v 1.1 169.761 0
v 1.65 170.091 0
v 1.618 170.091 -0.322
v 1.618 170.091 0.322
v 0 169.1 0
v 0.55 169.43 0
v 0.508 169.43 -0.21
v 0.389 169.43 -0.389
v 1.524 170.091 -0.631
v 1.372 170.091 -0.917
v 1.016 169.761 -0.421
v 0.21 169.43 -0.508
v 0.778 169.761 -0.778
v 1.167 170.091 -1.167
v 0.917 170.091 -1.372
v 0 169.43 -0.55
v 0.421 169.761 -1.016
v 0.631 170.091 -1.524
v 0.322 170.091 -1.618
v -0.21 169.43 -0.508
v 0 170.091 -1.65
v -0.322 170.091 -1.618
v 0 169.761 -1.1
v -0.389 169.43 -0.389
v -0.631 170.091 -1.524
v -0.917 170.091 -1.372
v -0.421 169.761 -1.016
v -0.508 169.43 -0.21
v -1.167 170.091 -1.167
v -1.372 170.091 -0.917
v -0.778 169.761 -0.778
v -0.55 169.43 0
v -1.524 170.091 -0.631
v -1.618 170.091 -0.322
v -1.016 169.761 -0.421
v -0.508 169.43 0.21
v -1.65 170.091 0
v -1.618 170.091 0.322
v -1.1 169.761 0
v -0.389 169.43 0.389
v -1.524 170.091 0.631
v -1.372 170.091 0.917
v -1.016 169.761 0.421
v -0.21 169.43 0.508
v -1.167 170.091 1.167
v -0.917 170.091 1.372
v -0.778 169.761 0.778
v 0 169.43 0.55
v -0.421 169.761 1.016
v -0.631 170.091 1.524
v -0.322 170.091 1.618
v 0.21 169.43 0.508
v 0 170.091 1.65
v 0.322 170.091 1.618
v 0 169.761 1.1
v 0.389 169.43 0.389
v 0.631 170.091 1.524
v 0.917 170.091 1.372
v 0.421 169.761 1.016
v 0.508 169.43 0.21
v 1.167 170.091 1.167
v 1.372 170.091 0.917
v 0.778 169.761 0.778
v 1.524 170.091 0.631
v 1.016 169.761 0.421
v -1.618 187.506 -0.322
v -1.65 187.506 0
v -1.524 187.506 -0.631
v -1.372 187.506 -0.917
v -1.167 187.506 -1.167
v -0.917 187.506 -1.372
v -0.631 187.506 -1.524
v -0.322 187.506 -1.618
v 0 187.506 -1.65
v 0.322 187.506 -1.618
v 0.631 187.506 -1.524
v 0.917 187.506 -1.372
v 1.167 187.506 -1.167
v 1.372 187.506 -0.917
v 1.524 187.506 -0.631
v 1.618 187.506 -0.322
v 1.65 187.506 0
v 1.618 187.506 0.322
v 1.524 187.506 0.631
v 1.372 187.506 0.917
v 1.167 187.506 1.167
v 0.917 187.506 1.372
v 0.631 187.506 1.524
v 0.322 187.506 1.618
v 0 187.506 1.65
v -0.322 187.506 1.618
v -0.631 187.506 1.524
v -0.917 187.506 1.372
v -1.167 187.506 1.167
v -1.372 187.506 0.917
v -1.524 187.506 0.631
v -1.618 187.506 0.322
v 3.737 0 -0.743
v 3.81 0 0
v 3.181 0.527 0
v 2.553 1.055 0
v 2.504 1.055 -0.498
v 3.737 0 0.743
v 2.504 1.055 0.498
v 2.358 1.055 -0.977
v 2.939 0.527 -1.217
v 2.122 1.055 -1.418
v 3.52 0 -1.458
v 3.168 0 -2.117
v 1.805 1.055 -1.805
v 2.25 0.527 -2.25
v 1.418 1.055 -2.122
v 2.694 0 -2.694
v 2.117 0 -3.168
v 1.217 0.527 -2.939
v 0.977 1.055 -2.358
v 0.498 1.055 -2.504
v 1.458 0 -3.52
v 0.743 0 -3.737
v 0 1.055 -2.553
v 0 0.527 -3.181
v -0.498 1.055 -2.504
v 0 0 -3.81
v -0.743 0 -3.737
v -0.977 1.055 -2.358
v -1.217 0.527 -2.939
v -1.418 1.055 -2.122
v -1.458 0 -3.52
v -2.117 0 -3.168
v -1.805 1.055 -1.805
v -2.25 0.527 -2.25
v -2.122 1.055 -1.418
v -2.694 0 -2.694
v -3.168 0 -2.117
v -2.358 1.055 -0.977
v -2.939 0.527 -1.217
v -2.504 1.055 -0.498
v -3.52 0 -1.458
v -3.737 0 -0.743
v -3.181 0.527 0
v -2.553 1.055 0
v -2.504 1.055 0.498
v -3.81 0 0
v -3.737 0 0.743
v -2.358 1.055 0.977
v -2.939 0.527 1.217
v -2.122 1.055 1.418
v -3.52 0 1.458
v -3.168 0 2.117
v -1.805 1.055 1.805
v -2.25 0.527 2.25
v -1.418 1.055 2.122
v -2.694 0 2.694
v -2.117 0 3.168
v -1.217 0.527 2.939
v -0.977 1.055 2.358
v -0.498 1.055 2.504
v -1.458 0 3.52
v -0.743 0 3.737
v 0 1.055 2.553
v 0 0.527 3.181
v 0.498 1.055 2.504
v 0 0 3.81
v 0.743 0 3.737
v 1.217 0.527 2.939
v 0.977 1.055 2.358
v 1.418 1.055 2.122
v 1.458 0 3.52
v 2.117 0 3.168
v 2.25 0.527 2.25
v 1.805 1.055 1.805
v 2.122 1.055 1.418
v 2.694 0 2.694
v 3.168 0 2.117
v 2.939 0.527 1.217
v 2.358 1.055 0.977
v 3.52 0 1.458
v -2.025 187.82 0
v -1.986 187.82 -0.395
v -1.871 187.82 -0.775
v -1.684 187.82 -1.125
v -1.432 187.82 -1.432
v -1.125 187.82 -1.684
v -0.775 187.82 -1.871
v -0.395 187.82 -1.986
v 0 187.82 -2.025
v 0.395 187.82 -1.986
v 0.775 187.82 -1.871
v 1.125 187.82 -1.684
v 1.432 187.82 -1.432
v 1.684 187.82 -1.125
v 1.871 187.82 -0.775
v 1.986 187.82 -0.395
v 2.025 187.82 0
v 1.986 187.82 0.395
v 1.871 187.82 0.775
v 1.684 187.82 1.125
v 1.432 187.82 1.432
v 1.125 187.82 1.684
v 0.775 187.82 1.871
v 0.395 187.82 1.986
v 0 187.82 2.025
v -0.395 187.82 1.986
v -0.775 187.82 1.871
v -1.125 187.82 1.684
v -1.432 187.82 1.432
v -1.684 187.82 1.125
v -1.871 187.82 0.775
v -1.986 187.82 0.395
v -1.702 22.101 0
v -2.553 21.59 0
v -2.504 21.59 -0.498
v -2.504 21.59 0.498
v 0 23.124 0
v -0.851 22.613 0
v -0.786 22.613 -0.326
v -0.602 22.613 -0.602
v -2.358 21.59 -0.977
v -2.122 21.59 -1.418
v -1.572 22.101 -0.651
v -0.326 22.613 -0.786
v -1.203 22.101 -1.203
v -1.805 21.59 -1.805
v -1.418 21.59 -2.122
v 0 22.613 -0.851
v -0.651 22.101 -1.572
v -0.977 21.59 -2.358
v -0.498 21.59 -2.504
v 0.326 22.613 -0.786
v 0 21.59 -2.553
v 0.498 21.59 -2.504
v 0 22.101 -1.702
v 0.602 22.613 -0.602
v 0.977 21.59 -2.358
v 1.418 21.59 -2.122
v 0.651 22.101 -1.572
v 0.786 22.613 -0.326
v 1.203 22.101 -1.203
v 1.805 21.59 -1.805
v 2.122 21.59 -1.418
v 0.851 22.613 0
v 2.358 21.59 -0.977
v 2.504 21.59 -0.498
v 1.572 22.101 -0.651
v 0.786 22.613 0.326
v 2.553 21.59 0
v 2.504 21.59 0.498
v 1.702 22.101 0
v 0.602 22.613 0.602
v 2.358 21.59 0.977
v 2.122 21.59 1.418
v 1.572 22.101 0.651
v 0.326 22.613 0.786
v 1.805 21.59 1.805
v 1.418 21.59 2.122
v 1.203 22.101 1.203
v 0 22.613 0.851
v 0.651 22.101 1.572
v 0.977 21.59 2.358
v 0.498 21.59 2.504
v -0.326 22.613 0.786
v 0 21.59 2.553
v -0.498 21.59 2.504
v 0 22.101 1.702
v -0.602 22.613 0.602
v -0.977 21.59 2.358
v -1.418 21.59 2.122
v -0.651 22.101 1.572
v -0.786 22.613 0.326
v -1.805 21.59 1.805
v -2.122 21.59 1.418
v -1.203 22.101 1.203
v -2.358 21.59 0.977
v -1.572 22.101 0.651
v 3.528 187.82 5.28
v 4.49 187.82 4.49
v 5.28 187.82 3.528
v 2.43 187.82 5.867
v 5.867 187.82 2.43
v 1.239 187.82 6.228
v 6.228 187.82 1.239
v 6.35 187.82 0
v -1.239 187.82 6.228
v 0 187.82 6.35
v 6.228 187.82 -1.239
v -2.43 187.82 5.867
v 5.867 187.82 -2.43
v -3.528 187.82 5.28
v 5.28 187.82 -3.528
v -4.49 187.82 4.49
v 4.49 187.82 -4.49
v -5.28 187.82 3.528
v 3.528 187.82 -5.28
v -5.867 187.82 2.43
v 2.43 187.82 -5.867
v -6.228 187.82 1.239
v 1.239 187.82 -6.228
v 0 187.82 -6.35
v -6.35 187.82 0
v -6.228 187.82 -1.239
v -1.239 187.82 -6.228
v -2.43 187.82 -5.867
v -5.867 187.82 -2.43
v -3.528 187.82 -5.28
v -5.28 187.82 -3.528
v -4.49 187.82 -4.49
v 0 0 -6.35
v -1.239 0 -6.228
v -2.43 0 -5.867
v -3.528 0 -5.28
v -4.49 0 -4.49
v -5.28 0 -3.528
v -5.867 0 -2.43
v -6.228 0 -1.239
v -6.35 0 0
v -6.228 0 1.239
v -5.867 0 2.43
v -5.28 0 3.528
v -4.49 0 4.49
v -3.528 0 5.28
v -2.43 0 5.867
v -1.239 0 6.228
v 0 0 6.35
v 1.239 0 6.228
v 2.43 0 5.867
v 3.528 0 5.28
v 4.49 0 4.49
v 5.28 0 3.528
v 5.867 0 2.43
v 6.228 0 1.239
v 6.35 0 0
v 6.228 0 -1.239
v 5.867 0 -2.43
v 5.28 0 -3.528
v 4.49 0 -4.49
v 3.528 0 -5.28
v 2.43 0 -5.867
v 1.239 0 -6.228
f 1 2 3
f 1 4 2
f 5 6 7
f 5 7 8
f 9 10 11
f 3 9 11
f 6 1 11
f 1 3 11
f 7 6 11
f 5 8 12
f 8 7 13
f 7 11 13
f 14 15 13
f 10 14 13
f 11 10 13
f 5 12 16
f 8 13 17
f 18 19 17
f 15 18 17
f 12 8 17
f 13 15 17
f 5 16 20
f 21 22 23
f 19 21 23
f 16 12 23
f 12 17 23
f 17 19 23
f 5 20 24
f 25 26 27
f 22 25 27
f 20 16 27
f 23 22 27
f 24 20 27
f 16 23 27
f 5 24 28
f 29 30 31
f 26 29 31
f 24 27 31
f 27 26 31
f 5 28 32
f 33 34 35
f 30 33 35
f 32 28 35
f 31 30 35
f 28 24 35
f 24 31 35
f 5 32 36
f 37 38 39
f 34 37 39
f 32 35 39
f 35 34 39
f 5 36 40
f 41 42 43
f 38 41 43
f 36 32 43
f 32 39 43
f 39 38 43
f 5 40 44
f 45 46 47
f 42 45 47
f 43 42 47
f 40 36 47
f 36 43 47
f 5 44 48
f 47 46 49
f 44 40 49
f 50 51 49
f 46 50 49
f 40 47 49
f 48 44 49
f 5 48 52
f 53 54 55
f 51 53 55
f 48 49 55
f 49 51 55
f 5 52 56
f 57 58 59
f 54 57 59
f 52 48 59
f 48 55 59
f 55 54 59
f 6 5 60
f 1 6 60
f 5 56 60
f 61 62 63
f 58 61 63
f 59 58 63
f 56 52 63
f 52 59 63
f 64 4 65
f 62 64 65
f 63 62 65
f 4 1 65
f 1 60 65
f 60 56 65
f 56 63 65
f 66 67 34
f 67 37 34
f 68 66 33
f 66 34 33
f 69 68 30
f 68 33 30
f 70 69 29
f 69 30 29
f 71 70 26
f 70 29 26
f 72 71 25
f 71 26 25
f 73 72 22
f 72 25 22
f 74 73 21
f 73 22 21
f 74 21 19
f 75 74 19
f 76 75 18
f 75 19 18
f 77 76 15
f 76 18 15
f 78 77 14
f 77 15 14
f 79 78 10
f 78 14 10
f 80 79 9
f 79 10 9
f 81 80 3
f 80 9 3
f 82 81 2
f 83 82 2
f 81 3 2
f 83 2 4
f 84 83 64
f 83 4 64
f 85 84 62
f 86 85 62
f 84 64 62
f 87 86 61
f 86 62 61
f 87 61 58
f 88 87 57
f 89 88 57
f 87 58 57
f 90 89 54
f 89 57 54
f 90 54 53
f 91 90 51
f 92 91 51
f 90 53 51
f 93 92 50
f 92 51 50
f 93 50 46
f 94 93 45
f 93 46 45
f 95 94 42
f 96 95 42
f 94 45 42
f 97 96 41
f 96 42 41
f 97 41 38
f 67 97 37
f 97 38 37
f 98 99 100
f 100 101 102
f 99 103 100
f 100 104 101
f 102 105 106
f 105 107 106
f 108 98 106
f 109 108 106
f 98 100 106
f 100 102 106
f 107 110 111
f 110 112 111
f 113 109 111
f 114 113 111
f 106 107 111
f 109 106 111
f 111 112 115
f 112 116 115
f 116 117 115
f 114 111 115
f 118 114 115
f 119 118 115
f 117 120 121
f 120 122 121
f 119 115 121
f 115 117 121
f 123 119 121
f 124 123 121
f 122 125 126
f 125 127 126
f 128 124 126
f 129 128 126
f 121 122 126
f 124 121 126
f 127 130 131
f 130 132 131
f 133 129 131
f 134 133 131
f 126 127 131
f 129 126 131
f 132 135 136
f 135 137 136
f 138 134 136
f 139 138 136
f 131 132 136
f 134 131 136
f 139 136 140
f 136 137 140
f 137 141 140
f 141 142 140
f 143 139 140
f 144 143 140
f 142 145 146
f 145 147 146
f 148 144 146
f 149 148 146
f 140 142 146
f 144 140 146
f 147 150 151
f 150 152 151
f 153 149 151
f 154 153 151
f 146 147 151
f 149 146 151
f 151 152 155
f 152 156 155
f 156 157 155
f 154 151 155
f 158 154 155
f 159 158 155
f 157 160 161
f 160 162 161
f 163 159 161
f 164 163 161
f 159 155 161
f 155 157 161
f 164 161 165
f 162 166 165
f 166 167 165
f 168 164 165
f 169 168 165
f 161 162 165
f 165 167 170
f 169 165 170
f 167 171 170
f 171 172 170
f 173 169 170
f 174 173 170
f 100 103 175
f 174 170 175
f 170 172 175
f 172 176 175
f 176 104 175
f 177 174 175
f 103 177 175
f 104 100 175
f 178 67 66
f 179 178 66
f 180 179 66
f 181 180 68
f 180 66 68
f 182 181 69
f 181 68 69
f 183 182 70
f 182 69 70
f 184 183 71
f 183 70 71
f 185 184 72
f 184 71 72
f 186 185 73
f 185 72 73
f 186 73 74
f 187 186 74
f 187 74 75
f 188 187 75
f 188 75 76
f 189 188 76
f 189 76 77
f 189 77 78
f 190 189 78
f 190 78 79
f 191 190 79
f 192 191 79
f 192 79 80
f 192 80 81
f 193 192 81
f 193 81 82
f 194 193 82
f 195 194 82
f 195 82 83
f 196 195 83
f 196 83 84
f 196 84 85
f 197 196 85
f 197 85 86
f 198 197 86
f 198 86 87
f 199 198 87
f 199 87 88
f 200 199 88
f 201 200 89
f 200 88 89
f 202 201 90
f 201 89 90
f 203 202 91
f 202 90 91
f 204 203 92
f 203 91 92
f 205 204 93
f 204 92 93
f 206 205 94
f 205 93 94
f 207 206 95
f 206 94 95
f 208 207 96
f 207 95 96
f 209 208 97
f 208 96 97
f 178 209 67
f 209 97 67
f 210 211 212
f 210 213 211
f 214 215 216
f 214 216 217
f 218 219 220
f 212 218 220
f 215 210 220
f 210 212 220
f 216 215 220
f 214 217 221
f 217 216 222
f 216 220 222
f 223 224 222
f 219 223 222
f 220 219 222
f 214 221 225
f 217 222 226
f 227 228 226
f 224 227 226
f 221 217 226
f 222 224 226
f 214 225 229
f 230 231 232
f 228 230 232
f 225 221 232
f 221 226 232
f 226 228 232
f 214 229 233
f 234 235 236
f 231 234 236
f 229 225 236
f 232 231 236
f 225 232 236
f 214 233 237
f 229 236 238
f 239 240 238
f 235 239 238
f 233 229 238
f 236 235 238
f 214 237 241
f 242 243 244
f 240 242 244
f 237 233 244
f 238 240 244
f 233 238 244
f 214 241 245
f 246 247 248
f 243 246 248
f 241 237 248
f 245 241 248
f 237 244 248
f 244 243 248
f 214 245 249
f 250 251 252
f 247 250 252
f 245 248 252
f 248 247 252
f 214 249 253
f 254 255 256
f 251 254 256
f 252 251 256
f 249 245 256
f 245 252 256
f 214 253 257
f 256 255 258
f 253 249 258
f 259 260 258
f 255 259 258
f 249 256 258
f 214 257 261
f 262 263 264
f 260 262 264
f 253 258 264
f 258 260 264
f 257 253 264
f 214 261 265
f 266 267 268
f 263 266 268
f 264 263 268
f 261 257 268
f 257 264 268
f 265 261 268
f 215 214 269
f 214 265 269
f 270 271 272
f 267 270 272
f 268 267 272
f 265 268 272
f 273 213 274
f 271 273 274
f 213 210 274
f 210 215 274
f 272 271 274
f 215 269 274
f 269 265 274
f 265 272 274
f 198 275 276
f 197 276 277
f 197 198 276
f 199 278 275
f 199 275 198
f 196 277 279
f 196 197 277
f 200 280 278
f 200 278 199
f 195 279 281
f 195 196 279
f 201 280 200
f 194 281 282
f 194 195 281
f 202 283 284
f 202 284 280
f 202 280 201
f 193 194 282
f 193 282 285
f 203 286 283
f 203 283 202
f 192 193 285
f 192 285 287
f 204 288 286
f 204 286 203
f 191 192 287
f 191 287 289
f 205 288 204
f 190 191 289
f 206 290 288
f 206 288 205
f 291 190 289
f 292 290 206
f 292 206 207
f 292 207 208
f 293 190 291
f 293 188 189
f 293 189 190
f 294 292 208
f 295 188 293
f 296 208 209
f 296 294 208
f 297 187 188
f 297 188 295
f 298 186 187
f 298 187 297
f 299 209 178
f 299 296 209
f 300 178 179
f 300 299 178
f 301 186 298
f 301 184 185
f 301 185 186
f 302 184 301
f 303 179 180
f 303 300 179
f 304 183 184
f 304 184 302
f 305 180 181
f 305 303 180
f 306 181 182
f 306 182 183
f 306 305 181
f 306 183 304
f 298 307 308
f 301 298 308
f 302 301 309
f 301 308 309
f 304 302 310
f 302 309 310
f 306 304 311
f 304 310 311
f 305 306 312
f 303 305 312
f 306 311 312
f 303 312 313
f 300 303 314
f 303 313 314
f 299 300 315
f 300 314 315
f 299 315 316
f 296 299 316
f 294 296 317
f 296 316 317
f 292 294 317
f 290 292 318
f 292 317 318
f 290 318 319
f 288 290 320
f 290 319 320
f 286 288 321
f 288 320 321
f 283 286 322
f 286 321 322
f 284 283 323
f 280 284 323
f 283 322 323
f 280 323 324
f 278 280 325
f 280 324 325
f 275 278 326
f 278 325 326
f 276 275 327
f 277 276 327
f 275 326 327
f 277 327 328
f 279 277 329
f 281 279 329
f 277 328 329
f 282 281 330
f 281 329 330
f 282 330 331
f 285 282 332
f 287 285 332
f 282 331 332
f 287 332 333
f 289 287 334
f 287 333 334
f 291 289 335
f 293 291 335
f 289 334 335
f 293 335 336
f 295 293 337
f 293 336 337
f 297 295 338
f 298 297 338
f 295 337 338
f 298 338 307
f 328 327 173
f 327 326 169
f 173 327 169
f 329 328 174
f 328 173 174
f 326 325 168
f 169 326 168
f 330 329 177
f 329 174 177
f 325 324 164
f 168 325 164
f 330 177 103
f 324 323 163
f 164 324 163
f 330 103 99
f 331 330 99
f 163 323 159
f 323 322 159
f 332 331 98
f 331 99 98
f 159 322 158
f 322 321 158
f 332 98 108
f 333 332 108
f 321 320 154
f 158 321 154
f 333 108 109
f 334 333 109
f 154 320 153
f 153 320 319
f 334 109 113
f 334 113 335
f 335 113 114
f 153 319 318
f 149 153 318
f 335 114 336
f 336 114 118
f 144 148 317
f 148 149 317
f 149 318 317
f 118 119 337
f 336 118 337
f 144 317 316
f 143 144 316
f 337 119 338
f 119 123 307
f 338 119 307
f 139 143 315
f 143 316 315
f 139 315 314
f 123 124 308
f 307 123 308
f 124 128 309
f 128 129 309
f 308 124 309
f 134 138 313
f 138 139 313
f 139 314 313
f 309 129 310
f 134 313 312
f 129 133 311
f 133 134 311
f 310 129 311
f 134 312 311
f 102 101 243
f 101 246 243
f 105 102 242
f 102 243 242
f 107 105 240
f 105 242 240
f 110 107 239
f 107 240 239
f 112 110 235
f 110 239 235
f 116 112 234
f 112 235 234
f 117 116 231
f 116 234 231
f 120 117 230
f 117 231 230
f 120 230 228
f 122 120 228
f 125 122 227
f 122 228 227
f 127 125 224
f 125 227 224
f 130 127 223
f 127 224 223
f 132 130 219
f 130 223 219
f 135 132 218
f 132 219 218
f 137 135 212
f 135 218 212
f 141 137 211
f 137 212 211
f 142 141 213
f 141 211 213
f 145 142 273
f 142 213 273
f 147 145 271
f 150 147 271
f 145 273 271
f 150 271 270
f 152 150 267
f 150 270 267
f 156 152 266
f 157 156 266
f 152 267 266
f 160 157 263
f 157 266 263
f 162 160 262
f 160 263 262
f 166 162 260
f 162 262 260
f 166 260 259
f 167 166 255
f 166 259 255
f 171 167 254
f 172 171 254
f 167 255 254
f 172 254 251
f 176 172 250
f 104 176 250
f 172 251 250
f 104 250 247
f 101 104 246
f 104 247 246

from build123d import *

# Parameters (mm, degrees)
SKETCH1_R                         = 6.35
BOSS_EXTRUDE1_DEPTH               = 187.8203
F_1_4_20_TAPPED_HOLE1_D           = 5.1054
F_1_4_20_TAPPED_HOLE1_DEPTH       = 21.59
F_1_4_20_TAPPED_HOLE1_CSINK_D     = 7.62
F_1_4_20_TAPPED_HOLE1_CSINK_ANGLE = 100
F_1_4_20_TAPPED_HOLE1_TIP         = 1.533816902
M4X0_7_TAPPED_HOLE1_D             = 3.3
M4X0_7_TAPPED_HOLE1_DEPTH         = 17.7292
M4X0_7_TAPPED_HOLE1_CSINK_D       = 4.05
M4X0_7_TAPPED_HOLE1_CSINK_ANGLE   = 100
M4X0_7_TAPPED_HOLE1_TIP           = 0.991420021


with BuildPart() as part:
    # Sketch1 → Boss-Extrude1 (new body)
    with BuildSketch(Plane(origin=(0, 0, 0), x_dir=(1, 0, 0), z_dir=(0, 1, 0))):
        with Locations(Location((0, 0, 0), (0, 0, 90))):
            Circle(SKETCH1_R)
    extrude(amount=BOSS_EXTRUDE1_DEPTH)

    # 1/4-20 Tapped Hole1
    with Locations(Plane(origin=(0, 0, 0), x_dir=(-1, 0, 0), z_dir=(0, -1, 0))):
        with Locations((0, 0)):
            CounterSinkHole(F_1_4_20_TAPPED_HOLE1_D / 2, F_1_4_20_TAPPED_HOLE1_CSINK_D / 2, depth=F_1_4_20_TAPPED_HOLE1_DEPTH, counter_sink_angle=F_1_4_20_TAPPED_HOLE1_CSINK_ANGLE)
            with Locations((0, 0, -(F_1_4_20_TAPPED_HOLE1_DEPTH + F_1_4_20_TAPPED_HOLE1_TIP / 2))):  # 118° drill point
                Cone(0, F_1_4_20_TAPPED_HOLE1_D / 2, F_1_4_20_TAPPED_HOLE1_TIP, mode=Mode.SUBTRACT)

    # M4x0.7 Tapped Hole1
    with Locations(Plane(origin=(0, 187.8203, 0), x_dir=(1, 0, 0), z_dir=(0, 1, 0))):
        with Locations((0, 0)):
            CounterSinkHole(M4X0_7_TAPPED_HOLE1_D / 2, M4X0_7_TAPPED_HOLE1_CSINK_D / 2, depth=M4X0_7_TAPPED_HOLE1_DEPTH, counter_sink_angle=M4X0_7_TAPPED_HOLE1_CSINK_ANGLE)
            with Locations((0, 0, -(M4X0_7_TAPPED_HOLE1_DEPTH + M4X0_7_TAPPED_HOLE1_TIP / 2))):  # 118° drill point
                Cone(0, M4X0_7_TAPPED_HOLE1_D / 2, M4X0_7_TAPPED_HOLE1_TIP, mode=Mode.SUBTRACT)


solid = part.part
